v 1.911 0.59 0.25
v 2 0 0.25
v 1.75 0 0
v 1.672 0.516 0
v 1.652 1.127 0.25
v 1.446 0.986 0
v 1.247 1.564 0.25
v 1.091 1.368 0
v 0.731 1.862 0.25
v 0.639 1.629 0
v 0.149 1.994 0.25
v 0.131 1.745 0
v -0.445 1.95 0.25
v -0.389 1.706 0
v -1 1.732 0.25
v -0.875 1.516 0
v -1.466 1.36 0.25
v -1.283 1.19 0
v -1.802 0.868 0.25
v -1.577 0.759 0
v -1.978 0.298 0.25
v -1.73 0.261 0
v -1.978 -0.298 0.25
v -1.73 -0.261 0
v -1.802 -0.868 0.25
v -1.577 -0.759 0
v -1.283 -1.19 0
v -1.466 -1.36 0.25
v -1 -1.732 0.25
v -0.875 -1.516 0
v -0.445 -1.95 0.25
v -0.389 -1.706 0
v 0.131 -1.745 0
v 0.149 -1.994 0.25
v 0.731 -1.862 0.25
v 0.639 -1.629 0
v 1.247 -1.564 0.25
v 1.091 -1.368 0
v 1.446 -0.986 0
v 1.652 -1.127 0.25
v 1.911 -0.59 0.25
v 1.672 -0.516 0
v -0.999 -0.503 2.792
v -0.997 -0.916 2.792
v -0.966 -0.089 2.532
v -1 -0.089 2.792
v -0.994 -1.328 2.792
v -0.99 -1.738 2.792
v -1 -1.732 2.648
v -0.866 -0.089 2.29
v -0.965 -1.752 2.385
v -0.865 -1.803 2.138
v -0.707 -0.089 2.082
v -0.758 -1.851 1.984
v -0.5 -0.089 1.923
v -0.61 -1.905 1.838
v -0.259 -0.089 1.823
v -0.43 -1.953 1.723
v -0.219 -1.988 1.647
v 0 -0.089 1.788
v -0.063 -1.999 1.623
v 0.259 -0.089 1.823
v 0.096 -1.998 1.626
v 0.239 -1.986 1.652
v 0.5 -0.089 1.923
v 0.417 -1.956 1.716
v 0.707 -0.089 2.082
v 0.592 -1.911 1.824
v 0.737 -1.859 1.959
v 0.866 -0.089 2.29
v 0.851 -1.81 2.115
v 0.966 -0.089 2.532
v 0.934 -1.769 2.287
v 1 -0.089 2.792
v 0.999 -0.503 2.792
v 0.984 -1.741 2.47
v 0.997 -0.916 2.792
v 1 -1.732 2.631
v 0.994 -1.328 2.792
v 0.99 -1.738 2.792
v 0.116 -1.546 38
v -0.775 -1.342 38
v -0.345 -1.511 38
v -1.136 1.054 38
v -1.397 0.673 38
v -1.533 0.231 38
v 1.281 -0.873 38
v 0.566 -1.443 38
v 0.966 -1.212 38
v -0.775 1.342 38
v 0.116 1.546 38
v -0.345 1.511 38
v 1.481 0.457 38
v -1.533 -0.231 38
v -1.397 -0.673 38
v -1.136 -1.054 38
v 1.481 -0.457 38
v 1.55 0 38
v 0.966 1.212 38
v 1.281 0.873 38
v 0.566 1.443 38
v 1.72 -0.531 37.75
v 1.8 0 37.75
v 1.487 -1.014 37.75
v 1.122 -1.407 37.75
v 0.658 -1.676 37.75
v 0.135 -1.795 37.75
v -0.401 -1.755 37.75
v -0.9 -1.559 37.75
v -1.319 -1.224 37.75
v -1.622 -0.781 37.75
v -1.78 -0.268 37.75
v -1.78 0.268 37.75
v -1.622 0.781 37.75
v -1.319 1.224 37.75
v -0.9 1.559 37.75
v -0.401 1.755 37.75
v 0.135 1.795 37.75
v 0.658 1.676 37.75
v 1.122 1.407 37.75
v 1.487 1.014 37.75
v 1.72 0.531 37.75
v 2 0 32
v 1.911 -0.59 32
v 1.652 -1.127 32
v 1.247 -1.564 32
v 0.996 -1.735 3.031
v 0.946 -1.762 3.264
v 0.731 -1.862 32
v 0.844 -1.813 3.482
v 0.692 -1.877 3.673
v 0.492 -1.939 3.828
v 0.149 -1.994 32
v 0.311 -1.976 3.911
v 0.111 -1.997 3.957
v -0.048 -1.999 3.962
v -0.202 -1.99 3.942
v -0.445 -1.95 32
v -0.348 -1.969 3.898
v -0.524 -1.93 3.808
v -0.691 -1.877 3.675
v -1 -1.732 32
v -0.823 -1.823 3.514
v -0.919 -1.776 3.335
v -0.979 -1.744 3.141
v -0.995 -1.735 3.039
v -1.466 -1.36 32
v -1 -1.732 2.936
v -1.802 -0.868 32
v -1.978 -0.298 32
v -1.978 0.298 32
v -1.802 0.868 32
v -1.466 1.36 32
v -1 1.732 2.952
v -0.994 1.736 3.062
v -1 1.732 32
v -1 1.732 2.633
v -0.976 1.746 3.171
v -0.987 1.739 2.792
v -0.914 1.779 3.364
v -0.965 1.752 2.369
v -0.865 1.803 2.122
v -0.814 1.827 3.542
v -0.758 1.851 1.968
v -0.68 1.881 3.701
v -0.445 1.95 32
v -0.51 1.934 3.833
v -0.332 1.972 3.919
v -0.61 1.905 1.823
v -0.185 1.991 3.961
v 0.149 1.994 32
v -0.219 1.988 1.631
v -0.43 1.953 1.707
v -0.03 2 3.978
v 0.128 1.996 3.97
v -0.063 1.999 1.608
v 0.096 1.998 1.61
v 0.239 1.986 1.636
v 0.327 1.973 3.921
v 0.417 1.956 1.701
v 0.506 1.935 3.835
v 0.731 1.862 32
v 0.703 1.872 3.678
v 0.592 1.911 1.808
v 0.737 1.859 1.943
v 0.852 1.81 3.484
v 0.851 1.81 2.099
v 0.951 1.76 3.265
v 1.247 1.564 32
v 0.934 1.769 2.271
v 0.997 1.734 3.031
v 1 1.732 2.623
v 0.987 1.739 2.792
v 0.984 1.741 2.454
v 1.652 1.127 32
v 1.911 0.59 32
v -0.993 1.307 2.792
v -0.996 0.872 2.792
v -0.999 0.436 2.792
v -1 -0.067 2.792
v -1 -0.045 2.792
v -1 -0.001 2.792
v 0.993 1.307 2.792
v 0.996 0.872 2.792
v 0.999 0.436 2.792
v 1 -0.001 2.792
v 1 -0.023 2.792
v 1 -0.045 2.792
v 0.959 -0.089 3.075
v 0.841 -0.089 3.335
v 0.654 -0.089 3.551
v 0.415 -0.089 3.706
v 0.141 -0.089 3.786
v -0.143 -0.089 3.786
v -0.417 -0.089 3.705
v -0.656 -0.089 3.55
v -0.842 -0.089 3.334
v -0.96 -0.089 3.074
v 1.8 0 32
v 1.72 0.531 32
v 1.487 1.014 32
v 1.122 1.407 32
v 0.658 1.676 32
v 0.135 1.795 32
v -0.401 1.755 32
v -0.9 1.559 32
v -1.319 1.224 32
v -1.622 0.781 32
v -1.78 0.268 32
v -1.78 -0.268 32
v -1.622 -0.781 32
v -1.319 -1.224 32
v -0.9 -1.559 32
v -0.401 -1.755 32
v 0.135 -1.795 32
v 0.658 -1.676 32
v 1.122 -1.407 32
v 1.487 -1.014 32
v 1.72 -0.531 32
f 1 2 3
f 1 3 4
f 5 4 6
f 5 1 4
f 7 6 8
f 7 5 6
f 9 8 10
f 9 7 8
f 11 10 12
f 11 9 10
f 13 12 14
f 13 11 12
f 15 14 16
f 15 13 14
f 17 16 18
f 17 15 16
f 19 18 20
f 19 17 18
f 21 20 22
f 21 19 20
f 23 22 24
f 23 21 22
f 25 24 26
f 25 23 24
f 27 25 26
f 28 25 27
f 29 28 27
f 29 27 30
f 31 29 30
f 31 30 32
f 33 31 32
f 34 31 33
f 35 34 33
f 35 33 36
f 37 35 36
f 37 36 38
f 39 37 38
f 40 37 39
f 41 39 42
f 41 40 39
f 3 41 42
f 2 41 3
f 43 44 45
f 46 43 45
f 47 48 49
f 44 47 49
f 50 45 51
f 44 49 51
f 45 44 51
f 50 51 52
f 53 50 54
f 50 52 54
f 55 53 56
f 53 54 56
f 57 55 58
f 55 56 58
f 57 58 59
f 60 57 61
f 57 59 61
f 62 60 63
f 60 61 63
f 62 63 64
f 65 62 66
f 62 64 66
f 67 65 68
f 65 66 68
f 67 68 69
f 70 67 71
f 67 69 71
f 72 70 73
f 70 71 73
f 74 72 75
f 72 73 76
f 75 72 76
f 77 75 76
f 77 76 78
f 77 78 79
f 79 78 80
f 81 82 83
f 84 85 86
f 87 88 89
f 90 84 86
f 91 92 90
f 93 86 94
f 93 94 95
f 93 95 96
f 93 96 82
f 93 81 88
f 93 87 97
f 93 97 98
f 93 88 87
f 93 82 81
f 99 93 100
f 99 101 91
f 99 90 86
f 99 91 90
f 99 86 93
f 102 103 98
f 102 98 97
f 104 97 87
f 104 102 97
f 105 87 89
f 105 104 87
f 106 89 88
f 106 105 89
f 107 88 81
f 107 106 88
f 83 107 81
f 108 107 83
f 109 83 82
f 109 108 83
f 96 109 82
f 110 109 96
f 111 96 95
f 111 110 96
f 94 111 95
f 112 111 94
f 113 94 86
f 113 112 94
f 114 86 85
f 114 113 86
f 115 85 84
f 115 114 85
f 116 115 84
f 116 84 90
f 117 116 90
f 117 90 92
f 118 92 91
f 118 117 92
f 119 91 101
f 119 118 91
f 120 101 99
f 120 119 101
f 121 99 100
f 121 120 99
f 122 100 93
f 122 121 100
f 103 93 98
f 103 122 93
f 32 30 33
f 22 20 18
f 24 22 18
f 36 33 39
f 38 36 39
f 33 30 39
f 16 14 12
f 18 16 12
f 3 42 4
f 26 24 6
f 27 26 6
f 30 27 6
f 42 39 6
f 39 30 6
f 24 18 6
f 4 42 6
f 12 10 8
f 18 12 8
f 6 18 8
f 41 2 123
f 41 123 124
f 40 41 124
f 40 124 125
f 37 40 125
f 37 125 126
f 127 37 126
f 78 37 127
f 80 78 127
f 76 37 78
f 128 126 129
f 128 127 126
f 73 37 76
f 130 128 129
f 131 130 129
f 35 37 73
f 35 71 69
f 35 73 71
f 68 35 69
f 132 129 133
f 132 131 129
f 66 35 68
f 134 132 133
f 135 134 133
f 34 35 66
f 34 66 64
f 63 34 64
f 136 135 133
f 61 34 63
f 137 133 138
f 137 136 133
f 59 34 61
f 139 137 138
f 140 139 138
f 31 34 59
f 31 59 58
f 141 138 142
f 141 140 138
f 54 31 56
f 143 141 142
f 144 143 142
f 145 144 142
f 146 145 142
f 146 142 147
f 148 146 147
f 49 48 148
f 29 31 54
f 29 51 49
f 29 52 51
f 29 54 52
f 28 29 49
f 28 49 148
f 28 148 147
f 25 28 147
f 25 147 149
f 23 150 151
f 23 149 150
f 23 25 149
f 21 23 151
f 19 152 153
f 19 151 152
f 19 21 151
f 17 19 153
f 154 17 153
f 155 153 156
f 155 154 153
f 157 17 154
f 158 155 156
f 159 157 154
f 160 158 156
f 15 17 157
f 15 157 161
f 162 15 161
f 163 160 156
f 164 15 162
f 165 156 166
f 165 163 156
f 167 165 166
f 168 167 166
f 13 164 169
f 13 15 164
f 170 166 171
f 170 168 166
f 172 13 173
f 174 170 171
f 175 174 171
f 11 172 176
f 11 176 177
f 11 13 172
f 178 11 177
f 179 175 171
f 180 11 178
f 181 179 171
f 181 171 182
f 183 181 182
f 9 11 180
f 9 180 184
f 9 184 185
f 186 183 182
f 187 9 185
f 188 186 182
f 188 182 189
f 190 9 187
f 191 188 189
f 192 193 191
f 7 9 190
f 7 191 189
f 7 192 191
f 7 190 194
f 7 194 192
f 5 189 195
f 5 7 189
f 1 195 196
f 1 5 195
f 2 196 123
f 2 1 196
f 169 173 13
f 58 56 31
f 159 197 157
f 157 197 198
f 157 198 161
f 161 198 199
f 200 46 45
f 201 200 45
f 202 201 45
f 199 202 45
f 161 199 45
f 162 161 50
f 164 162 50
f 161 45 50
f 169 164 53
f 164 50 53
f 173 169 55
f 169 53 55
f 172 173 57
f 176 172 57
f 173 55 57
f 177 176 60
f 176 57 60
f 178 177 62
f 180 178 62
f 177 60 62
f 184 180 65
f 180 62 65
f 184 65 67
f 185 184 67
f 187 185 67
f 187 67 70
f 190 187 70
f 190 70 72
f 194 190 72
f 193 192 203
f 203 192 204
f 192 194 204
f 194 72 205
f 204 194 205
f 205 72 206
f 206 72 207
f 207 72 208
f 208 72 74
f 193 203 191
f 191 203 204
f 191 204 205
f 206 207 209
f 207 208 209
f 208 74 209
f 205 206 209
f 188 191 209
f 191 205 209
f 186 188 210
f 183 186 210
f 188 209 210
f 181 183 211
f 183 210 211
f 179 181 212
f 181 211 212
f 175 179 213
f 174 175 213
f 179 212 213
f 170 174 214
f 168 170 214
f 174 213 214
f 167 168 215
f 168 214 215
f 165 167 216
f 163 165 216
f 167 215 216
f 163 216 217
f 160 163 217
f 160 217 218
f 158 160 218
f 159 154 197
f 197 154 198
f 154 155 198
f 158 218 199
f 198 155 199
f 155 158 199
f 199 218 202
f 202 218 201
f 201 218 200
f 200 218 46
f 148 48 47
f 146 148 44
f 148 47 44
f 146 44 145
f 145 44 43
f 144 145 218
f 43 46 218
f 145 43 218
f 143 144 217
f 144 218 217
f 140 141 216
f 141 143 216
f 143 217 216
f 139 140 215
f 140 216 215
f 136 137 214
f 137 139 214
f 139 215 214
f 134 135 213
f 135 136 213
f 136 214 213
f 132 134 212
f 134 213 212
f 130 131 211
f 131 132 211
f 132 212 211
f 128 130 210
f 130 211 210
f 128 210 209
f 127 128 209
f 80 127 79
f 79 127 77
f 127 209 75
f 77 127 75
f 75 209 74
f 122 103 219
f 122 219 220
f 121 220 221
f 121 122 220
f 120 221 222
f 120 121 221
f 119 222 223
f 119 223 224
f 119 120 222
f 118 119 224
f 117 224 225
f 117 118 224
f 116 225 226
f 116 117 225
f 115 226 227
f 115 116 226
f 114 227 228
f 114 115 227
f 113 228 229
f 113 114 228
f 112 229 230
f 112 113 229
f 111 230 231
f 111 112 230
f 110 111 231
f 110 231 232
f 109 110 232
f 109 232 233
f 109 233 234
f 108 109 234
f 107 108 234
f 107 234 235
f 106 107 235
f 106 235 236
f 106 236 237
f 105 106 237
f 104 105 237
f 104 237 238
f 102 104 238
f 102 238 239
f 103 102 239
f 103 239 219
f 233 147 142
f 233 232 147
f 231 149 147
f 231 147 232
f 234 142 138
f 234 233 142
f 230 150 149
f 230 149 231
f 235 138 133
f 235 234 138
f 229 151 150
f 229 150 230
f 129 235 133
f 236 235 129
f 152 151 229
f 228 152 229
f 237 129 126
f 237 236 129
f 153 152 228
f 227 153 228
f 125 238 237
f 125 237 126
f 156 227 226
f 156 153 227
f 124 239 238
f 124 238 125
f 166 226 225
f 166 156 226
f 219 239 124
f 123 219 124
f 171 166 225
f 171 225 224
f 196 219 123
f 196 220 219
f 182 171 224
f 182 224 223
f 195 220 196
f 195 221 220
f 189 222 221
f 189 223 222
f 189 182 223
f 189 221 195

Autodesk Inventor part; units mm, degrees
ref_plane "YZ Plane" through (0, 0, 0) normal (1, 0, 0) x (0, 1, 0)
sketch "Sketch1" plane through (0, 0, 0) normal (0, 0, 1) x (1, 0, 0)
  circle A0 centre (0, 0) radius 2
  dimension "d0" = 4
extrude "Extrusion1" add sketch "Sketch1" along normal blind 38
ref_plane "Work Plane1" through (6.4921, 0, 2.8) normal (0, -0.9962, -0.0872) x (-1, 0, 0)
sketch "Sketch3" plane through (6.4921, 0, 2.8) normal (0, -0.9962, -0.0872) x (-1, 0, 0)
  ellipse E0 centre (6.4921, 0) end of major axis (6.4921, -22.9474) minor radius 2 (4.5072, 2.8107) -> (8.477, 2.8107) ccw projected
  line L0 (4.5072, 2.8107) -> (8.477, 2.8107) projected
  ellipse E1 centre (6.4921, 2.7893) end of major axis (8.4921, 2.7893) minor radius 0.1743 projected
  circle A0 centre (6.4921, 0) radius 1
  point P0 (6.4921, -0.0107)
  dimension "d6" = 2.8
  dimension "d14" = 2
extrude "Extrusion2" cut sketch "Sketch3" along normal through all both and the other way through all contours A0
ref_plane "Work Plane2" through (6.4921, 0, 2.8) normal (0, -0.9962, 0.0872) x (-1, 0, 0)
sketch "Sketch5" plane through (6.4921, 0, 2.8) normal (0, -0.9962, 0.0872) x (-1, 0, 0)
  circle A0 centre (6.4921, 0.0156) radius 1
  point P0 (6.4921, 2.7893)
  dimension "d18" = 2
extrude "Extrusion3" cut sketch "Sketch5" along normal through all both and the other way through all
sketch "Sketch7" plane through (0, 0, 38) normal (0, 0, 1) x (1, 0, 0)
  circle A0 centre (0, 0) radius 2 projected
  circle A1 centre (0, 0) radius 1.8
  dimension "d27" = 3.6
extrude "Extrusion4" cut sketch "Sketch7" against normal blind 6
chamfer "Chamfer2" distance 0.25 angle 45 2 edges at (-1.8, 0, 38) (-2, 0, 0)
properties part number "Link Arm1"
